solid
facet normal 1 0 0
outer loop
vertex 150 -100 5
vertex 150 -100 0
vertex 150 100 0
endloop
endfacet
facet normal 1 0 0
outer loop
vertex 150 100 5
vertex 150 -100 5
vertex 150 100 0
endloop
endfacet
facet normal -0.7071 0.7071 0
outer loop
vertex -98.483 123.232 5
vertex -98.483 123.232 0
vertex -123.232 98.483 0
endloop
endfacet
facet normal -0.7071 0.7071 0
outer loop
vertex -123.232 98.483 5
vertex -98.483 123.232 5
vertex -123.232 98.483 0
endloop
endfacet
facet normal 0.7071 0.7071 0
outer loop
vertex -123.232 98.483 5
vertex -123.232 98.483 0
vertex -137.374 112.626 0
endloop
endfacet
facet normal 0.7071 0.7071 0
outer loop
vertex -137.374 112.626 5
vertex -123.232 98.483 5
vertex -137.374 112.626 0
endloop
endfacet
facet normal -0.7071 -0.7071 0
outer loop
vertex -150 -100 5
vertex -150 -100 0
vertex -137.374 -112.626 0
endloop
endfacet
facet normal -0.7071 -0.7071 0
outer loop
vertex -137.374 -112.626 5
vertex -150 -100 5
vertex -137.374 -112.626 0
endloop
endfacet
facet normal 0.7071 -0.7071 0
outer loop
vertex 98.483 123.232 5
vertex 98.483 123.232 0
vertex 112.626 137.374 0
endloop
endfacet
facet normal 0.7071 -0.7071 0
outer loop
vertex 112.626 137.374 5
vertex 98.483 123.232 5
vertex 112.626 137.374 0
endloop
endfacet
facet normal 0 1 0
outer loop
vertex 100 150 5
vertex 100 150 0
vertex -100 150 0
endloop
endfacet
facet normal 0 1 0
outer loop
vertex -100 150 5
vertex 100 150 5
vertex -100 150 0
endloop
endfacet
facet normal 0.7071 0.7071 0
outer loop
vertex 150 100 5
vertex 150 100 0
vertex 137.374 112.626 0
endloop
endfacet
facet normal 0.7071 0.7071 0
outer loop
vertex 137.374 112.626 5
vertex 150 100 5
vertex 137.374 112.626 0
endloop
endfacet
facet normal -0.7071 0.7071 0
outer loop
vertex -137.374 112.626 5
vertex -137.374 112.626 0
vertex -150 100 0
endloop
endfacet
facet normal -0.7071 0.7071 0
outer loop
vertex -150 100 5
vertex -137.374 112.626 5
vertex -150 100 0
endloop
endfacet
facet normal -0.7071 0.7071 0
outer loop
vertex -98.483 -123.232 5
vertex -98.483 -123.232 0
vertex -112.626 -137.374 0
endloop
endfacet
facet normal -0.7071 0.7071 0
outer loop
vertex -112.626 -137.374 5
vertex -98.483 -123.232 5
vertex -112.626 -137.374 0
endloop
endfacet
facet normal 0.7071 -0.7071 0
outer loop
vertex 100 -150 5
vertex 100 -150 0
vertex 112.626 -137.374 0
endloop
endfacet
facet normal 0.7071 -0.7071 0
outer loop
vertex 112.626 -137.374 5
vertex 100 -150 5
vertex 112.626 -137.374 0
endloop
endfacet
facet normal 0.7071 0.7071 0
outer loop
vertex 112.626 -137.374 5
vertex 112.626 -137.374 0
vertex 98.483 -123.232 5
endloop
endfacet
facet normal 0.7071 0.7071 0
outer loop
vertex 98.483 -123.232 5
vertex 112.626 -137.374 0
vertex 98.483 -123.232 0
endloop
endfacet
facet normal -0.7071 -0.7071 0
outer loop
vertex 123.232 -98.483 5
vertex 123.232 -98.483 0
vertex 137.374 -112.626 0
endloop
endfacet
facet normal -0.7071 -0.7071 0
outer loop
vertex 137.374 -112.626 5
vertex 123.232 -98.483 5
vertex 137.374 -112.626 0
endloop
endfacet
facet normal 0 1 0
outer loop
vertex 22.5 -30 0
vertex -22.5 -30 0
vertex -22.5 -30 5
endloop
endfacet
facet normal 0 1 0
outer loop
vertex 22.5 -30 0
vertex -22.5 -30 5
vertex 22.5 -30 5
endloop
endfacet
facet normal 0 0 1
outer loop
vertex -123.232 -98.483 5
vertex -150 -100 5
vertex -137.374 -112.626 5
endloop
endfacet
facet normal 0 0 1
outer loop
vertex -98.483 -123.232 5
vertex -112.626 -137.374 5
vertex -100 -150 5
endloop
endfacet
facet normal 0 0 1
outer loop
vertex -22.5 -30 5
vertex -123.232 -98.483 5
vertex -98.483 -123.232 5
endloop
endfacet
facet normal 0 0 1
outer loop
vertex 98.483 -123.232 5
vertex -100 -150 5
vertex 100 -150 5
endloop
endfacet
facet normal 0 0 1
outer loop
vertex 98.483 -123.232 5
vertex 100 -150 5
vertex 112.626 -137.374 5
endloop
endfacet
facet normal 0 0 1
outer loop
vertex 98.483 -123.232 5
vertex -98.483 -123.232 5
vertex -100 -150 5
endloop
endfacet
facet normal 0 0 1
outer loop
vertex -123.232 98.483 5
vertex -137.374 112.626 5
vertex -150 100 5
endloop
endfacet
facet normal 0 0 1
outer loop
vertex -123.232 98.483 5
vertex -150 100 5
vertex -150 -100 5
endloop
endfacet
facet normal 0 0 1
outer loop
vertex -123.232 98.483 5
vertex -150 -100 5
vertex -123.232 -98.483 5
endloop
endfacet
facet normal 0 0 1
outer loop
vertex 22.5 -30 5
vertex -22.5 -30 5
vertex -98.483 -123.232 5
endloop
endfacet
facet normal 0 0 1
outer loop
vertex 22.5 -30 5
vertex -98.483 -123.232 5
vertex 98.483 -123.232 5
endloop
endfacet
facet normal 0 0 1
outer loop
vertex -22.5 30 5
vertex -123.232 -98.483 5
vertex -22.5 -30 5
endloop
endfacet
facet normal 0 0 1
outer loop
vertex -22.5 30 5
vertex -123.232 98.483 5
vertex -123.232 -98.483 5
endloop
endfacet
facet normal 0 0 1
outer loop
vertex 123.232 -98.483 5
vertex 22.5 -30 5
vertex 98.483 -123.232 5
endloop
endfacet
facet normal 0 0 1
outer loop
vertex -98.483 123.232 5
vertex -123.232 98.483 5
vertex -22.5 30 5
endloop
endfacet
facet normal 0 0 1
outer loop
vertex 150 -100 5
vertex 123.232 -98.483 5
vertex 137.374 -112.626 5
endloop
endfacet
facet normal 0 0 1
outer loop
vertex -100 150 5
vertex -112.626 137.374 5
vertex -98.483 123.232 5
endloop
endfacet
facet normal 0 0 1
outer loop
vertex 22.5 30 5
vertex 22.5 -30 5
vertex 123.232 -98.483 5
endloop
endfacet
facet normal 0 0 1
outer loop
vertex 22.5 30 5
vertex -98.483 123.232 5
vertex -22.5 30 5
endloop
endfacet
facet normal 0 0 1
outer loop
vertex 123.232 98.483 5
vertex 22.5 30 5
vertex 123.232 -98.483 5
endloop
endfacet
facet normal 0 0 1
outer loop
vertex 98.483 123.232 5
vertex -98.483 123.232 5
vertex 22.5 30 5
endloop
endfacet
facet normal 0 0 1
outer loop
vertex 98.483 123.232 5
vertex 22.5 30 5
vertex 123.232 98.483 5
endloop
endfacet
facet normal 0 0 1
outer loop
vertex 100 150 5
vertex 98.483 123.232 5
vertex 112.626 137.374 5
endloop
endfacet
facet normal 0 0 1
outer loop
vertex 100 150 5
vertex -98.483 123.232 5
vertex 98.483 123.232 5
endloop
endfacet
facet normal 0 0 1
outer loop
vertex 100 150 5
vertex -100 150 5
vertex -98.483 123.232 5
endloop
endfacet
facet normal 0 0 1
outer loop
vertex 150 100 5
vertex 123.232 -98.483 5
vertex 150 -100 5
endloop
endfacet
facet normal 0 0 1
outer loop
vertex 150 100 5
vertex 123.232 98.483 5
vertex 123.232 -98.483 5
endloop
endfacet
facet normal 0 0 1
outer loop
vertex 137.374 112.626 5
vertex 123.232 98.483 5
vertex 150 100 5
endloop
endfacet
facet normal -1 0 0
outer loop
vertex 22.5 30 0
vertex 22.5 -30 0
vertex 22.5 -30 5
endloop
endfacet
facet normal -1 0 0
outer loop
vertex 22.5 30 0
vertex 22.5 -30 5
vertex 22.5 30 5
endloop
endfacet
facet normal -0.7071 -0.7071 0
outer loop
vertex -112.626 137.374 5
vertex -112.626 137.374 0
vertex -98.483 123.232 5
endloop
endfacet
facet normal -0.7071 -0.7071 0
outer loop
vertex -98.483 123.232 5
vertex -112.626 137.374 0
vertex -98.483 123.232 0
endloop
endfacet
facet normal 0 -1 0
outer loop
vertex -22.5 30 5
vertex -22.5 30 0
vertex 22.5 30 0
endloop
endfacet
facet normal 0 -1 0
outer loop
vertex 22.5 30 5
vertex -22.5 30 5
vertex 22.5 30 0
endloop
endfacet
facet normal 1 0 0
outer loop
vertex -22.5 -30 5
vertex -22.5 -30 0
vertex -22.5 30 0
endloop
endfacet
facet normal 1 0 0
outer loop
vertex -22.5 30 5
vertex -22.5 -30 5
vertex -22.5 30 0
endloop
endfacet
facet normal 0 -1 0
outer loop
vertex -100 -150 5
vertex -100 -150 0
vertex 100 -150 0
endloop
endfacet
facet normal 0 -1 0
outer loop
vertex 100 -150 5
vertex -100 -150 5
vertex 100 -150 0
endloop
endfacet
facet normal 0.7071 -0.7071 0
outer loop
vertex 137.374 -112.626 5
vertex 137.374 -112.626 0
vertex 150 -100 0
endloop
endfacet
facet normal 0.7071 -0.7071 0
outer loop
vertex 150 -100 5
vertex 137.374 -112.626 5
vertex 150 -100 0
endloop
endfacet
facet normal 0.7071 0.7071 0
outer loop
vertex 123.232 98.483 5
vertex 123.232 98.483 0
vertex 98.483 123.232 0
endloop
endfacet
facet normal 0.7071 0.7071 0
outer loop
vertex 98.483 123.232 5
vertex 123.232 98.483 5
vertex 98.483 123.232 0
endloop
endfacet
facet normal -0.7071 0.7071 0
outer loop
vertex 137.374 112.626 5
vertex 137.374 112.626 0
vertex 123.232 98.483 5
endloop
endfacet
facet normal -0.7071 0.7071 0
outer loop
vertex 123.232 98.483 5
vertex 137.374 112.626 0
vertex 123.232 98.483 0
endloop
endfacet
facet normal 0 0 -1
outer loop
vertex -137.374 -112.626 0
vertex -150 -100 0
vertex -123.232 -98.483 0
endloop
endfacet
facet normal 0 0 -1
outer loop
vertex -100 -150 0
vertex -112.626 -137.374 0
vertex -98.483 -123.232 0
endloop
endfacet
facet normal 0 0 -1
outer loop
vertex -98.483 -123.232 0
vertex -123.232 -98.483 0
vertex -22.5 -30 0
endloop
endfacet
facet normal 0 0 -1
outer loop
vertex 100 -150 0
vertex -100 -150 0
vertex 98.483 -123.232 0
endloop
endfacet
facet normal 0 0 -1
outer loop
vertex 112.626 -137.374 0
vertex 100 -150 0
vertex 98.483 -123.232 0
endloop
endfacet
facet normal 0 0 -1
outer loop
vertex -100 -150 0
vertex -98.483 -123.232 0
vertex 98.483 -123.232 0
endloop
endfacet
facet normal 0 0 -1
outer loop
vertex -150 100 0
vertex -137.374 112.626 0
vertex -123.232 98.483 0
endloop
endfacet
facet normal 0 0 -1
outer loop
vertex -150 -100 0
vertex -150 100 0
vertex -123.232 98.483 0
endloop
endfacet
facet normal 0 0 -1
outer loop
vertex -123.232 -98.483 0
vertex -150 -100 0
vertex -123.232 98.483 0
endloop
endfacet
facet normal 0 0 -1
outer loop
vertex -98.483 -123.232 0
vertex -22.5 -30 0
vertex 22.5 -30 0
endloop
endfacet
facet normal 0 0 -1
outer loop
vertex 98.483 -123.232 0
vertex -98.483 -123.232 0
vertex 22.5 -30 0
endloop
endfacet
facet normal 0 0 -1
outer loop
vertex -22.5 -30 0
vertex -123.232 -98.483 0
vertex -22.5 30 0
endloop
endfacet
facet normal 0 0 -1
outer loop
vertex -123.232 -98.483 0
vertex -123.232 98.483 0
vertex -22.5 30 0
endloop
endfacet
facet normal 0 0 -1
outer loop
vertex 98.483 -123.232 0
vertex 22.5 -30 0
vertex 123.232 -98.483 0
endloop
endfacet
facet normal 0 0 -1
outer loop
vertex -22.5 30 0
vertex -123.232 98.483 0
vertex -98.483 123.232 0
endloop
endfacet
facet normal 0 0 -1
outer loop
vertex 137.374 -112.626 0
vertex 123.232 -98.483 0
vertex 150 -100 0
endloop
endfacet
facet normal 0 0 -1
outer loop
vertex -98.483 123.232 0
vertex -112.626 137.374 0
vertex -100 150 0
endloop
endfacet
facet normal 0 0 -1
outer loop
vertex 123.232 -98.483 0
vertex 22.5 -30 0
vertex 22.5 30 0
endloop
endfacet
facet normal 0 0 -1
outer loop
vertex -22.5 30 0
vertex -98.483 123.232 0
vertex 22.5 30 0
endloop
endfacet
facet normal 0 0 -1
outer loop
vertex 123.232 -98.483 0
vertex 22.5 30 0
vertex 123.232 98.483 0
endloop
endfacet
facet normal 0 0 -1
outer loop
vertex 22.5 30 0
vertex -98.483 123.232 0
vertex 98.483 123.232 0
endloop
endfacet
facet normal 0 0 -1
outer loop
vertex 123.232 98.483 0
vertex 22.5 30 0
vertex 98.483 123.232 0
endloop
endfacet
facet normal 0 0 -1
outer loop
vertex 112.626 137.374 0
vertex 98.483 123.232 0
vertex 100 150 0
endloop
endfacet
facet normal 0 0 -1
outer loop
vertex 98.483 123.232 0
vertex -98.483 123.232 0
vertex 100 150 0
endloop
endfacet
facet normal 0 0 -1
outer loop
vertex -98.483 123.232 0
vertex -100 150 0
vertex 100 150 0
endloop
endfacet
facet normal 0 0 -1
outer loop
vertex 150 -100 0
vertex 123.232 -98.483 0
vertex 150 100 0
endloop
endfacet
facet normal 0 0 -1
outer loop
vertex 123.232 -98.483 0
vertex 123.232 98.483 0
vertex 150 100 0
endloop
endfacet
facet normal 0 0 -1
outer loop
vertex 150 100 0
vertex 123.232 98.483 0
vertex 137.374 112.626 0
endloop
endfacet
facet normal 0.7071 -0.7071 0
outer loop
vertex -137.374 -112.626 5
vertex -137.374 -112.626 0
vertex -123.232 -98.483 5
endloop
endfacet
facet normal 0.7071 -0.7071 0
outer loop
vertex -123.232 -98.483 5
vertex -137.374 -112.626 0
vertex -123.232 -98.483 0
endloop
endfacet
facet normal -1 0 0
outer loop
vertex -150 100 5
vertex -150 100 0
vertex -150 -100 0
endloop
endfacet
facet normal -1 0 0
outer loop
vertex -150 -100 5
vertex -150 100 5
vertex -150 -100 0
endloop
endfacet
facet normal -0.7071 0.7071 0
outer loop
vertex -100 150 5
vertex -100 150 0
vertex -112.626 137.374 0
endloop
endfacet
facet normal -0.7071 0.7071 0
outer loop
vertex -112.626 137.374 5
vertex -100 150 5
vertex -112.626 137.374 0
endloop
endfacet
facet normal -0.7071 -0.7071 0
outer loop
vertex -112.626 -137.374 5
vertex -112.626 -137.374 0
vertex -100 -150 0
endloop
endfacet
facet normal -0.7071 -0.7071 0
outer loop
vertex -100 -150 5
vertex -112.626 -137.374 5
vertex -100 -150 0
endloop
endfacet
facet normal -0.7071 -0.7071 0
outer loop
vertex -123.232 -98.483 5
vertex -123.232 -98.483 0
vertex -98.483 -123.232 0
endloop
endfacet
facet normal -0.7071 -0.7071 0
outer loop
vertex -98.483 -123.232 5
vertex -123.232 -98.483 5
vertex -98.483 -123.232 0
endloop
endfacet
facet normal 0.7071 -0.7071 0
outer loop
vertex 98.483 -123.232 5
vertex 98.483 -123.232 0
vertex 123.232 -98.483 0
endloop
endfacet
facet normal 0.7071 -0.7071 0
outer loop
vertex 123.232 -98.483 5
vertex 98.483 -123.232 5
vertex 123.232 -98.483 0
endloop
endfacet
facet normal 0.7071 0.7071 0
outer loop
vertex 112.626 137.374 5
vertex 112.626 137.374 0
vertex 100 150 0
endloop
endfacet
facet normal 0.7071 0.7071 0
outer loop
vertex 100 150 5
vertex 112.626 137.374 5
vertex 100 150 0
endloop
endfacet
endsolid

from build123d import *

# Parameters (mm, degrees)
ESQUISSE1_W        = 45
ESQUISSE1_H        = 60
BOSS_EXTRU_1_DEPTH = 5


with BuildPart() as part:
    # Esquisse1 → Boss.-Extru.1 (new body)
    with BuildSketch(Plane.XY):
        Polygon((112.625631329, 137.374368671), (100, 150), (-100, 150), (-112.625631329, 137.374368671), (-98.483495706, 123.232233047), (-123.232233047, 98.483495706), (-137.374368671, 112.625631329), (-150, 100), (-150, -100), (-137.374368671, -112.625631329), (-123.232233047, -98.483495706), (-98.483495706, -123.232233047), (-112.625631329, -137.374368671), (-100, -150), (100, -150), (112.625631329, -137.374368671), (98.483495706, -123.232233047), (123.232233047, -98.483495706), (137.374368671, -112.625631329), (150, -100), (150, 100), (137.374368671, 112.625631329), (123.232233047, 98.483495706), (98.483495706, 123.232233047), align=None)
        Rectangle(ESQUISSE1_W, ESQUISSE1_H, mode=Mode.SUBTRACT)
    extrude(amount=BOSS_EXTRU_1_DEPTH)


solid = part.part
